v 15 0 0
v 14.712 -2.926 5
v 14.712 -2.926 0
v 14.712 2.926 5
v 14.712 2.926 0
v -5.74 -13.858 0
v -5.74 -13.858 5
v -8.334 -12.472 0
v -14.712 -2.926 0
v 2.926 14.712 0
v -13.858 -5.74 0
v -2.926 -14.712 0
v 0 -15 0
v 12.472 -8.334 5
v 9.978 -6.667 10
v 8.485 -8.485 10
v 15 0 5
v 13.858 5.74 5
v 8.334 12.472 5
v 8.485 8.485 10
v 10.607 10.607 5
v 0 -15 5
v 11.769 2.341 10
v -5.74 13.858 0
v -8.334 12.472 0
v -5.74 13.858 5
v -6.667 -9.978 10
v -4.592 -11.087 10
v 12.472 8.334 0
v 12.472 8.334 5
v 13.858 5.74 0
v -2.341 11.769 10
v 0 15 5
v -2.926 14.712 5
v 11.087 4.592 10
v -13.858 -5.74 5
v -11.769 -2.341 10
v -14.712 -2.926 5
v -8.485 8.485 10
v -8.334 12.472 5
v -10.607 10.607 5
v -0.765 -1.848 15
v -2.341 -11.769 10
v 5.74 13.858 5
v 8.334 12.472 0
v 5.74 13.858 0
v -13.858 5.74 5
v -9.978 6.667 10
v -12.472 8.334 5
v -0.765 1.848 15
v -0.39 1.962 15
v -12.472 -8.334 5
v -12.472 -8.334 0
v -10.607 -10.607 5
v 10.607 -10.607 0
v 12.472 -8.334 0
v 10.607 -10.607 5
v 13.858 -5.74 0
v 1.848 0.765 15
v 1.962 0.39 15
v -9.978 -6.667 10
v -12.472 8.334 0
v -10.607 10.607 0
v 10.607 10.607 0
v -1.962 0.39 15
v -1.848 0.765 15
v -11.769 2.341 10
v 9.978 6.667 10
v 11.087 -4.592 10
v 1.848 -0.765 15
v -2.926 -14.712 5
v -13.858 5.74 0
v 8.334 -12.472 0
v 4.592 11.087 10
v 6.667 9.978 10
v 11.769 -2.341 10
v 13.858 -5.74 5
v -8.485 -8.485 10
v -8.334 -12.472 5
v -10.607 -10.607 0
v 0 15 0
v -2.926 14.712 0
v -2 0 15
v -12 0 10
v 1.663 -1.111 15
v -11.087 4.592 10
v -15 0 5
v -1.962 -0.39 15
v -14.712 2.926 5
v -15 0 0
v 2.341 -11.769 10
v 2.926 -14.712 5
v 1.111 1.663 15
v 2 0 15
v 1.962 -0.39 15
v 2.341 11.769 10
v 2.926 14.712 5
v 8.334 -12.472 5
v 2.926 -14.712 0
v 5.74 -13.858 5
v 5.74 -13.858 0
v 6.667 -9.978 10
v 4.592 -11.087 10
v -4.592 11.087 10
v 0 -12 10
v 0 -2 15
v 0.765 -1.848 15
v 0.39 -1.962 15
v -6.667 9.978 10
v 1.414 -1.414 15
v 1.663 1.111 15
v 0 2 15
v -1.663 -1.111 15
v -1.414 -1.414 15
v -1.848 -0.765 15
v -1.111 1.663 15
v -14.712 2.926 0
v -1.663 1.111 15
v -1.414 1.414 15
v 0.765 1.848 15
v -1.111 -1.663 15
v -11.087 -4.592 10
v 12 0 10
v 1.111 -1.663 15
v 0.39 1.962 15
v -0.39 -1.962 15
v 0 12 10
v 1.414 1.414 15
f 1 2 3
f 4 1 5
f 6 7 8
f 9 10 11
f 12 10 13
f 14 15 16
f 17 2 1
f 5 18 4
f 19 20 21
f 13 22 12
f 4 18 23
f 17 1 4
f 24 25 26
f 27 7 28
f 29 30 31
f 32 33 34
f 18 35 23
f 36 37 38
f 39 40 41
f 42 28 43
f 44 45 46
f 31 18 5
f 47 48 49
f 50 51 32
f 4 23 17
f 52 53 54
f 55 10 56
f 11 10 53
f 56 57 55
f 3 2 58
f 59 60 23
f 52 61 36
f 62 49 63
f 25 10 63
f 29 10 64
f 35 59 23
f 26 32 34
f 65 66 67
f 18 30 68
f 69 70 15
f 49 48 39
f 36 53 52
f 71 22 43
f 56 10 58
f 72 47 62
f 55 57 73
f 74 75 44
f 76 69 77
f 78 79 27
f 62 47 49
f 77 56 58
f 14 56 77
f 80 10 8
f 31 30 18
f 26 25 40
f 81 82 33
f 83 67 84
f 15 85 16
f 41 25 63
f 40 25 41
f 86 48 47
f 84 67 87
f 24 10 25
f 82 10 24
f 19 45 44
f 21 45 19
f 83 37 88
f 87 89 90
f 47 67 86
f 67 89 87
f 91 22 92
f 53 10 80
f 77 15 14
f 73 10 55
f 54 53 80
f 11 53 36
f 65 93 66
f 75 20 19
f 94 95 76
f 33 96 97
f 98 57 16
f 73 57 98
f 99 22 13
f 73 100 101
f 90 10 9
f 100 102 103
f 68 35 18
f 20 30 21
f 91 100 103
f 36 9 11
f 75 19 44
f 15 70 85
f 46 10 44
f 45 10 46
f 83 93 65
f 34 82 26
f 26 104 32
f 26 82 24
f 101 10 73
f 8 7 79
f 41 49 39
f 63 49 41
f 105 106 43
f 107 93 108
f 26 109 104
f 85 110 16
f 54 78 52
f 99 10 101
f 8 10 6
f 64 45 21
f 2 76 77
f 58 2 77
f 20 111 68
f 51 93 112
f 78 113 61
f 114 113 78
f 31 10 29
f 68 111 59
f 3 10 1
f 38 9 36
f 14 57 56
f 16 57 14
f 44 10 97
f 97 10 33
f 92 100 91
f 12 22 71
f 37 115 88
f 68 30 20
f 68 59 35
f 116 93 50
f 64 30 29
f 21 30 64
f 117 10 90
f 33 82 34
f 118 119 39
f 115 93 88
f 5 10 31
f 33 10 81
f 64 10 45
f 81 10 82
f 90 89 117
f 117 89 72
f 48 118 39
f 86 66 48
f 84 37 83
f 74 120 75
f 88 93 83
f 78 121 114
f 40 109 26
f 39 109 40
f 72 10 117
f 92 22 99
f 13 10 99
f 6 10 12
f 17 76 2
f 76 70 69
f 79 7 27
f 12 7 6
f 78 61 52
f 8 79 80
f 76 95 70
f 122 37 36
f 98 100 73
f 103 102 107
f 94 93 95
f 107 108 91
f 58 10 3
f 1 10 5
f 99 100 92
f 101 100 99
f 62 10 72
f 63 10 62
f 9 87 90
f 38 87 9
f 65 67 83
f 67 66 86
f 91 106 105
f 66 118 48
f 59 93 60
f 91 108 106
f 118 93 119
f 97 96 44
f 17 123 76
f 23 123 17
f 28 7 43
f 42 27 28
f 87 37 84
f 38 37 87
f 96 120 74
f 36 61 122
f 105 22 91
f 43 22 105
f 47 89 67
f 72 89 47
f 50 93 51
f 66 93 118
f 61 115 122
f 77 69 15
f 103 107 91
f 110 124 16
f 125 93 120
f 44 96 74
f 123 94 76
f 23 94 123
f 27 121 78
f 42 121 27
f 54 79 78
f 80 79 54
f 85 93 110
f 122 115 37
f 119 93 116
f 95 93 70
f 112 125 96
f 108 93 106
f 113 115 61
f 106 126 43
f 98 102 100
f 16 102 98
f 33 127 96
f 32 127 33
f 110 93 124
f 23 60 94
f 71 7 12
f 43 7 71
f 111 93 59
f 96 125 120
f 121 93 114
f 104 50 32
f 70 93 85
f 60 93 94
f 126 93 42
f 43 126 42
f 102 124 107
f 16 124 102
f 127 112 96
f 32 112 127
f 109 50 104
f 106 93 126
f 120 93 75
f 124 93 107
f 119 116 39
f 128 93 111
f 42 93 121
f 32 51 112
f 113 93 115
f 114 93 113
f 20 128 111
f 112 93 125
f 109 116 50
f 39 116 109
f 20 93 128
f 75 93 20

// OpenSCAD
// Simple hull test: 3 cylinders along Z-axis
$fn = 32; // low resolution for testing

hull() {
    // Cylinder 1
    cylinder(h=5, r1=15, r2=15, center=false);

    // Cylinder 2, offset in Z
        cylinder(h=10, r1=12, r2=12, center=false);

    // Cylinder 3, further offset
        cylinder(h=15, r1=2, r2=2, center=false);
}
